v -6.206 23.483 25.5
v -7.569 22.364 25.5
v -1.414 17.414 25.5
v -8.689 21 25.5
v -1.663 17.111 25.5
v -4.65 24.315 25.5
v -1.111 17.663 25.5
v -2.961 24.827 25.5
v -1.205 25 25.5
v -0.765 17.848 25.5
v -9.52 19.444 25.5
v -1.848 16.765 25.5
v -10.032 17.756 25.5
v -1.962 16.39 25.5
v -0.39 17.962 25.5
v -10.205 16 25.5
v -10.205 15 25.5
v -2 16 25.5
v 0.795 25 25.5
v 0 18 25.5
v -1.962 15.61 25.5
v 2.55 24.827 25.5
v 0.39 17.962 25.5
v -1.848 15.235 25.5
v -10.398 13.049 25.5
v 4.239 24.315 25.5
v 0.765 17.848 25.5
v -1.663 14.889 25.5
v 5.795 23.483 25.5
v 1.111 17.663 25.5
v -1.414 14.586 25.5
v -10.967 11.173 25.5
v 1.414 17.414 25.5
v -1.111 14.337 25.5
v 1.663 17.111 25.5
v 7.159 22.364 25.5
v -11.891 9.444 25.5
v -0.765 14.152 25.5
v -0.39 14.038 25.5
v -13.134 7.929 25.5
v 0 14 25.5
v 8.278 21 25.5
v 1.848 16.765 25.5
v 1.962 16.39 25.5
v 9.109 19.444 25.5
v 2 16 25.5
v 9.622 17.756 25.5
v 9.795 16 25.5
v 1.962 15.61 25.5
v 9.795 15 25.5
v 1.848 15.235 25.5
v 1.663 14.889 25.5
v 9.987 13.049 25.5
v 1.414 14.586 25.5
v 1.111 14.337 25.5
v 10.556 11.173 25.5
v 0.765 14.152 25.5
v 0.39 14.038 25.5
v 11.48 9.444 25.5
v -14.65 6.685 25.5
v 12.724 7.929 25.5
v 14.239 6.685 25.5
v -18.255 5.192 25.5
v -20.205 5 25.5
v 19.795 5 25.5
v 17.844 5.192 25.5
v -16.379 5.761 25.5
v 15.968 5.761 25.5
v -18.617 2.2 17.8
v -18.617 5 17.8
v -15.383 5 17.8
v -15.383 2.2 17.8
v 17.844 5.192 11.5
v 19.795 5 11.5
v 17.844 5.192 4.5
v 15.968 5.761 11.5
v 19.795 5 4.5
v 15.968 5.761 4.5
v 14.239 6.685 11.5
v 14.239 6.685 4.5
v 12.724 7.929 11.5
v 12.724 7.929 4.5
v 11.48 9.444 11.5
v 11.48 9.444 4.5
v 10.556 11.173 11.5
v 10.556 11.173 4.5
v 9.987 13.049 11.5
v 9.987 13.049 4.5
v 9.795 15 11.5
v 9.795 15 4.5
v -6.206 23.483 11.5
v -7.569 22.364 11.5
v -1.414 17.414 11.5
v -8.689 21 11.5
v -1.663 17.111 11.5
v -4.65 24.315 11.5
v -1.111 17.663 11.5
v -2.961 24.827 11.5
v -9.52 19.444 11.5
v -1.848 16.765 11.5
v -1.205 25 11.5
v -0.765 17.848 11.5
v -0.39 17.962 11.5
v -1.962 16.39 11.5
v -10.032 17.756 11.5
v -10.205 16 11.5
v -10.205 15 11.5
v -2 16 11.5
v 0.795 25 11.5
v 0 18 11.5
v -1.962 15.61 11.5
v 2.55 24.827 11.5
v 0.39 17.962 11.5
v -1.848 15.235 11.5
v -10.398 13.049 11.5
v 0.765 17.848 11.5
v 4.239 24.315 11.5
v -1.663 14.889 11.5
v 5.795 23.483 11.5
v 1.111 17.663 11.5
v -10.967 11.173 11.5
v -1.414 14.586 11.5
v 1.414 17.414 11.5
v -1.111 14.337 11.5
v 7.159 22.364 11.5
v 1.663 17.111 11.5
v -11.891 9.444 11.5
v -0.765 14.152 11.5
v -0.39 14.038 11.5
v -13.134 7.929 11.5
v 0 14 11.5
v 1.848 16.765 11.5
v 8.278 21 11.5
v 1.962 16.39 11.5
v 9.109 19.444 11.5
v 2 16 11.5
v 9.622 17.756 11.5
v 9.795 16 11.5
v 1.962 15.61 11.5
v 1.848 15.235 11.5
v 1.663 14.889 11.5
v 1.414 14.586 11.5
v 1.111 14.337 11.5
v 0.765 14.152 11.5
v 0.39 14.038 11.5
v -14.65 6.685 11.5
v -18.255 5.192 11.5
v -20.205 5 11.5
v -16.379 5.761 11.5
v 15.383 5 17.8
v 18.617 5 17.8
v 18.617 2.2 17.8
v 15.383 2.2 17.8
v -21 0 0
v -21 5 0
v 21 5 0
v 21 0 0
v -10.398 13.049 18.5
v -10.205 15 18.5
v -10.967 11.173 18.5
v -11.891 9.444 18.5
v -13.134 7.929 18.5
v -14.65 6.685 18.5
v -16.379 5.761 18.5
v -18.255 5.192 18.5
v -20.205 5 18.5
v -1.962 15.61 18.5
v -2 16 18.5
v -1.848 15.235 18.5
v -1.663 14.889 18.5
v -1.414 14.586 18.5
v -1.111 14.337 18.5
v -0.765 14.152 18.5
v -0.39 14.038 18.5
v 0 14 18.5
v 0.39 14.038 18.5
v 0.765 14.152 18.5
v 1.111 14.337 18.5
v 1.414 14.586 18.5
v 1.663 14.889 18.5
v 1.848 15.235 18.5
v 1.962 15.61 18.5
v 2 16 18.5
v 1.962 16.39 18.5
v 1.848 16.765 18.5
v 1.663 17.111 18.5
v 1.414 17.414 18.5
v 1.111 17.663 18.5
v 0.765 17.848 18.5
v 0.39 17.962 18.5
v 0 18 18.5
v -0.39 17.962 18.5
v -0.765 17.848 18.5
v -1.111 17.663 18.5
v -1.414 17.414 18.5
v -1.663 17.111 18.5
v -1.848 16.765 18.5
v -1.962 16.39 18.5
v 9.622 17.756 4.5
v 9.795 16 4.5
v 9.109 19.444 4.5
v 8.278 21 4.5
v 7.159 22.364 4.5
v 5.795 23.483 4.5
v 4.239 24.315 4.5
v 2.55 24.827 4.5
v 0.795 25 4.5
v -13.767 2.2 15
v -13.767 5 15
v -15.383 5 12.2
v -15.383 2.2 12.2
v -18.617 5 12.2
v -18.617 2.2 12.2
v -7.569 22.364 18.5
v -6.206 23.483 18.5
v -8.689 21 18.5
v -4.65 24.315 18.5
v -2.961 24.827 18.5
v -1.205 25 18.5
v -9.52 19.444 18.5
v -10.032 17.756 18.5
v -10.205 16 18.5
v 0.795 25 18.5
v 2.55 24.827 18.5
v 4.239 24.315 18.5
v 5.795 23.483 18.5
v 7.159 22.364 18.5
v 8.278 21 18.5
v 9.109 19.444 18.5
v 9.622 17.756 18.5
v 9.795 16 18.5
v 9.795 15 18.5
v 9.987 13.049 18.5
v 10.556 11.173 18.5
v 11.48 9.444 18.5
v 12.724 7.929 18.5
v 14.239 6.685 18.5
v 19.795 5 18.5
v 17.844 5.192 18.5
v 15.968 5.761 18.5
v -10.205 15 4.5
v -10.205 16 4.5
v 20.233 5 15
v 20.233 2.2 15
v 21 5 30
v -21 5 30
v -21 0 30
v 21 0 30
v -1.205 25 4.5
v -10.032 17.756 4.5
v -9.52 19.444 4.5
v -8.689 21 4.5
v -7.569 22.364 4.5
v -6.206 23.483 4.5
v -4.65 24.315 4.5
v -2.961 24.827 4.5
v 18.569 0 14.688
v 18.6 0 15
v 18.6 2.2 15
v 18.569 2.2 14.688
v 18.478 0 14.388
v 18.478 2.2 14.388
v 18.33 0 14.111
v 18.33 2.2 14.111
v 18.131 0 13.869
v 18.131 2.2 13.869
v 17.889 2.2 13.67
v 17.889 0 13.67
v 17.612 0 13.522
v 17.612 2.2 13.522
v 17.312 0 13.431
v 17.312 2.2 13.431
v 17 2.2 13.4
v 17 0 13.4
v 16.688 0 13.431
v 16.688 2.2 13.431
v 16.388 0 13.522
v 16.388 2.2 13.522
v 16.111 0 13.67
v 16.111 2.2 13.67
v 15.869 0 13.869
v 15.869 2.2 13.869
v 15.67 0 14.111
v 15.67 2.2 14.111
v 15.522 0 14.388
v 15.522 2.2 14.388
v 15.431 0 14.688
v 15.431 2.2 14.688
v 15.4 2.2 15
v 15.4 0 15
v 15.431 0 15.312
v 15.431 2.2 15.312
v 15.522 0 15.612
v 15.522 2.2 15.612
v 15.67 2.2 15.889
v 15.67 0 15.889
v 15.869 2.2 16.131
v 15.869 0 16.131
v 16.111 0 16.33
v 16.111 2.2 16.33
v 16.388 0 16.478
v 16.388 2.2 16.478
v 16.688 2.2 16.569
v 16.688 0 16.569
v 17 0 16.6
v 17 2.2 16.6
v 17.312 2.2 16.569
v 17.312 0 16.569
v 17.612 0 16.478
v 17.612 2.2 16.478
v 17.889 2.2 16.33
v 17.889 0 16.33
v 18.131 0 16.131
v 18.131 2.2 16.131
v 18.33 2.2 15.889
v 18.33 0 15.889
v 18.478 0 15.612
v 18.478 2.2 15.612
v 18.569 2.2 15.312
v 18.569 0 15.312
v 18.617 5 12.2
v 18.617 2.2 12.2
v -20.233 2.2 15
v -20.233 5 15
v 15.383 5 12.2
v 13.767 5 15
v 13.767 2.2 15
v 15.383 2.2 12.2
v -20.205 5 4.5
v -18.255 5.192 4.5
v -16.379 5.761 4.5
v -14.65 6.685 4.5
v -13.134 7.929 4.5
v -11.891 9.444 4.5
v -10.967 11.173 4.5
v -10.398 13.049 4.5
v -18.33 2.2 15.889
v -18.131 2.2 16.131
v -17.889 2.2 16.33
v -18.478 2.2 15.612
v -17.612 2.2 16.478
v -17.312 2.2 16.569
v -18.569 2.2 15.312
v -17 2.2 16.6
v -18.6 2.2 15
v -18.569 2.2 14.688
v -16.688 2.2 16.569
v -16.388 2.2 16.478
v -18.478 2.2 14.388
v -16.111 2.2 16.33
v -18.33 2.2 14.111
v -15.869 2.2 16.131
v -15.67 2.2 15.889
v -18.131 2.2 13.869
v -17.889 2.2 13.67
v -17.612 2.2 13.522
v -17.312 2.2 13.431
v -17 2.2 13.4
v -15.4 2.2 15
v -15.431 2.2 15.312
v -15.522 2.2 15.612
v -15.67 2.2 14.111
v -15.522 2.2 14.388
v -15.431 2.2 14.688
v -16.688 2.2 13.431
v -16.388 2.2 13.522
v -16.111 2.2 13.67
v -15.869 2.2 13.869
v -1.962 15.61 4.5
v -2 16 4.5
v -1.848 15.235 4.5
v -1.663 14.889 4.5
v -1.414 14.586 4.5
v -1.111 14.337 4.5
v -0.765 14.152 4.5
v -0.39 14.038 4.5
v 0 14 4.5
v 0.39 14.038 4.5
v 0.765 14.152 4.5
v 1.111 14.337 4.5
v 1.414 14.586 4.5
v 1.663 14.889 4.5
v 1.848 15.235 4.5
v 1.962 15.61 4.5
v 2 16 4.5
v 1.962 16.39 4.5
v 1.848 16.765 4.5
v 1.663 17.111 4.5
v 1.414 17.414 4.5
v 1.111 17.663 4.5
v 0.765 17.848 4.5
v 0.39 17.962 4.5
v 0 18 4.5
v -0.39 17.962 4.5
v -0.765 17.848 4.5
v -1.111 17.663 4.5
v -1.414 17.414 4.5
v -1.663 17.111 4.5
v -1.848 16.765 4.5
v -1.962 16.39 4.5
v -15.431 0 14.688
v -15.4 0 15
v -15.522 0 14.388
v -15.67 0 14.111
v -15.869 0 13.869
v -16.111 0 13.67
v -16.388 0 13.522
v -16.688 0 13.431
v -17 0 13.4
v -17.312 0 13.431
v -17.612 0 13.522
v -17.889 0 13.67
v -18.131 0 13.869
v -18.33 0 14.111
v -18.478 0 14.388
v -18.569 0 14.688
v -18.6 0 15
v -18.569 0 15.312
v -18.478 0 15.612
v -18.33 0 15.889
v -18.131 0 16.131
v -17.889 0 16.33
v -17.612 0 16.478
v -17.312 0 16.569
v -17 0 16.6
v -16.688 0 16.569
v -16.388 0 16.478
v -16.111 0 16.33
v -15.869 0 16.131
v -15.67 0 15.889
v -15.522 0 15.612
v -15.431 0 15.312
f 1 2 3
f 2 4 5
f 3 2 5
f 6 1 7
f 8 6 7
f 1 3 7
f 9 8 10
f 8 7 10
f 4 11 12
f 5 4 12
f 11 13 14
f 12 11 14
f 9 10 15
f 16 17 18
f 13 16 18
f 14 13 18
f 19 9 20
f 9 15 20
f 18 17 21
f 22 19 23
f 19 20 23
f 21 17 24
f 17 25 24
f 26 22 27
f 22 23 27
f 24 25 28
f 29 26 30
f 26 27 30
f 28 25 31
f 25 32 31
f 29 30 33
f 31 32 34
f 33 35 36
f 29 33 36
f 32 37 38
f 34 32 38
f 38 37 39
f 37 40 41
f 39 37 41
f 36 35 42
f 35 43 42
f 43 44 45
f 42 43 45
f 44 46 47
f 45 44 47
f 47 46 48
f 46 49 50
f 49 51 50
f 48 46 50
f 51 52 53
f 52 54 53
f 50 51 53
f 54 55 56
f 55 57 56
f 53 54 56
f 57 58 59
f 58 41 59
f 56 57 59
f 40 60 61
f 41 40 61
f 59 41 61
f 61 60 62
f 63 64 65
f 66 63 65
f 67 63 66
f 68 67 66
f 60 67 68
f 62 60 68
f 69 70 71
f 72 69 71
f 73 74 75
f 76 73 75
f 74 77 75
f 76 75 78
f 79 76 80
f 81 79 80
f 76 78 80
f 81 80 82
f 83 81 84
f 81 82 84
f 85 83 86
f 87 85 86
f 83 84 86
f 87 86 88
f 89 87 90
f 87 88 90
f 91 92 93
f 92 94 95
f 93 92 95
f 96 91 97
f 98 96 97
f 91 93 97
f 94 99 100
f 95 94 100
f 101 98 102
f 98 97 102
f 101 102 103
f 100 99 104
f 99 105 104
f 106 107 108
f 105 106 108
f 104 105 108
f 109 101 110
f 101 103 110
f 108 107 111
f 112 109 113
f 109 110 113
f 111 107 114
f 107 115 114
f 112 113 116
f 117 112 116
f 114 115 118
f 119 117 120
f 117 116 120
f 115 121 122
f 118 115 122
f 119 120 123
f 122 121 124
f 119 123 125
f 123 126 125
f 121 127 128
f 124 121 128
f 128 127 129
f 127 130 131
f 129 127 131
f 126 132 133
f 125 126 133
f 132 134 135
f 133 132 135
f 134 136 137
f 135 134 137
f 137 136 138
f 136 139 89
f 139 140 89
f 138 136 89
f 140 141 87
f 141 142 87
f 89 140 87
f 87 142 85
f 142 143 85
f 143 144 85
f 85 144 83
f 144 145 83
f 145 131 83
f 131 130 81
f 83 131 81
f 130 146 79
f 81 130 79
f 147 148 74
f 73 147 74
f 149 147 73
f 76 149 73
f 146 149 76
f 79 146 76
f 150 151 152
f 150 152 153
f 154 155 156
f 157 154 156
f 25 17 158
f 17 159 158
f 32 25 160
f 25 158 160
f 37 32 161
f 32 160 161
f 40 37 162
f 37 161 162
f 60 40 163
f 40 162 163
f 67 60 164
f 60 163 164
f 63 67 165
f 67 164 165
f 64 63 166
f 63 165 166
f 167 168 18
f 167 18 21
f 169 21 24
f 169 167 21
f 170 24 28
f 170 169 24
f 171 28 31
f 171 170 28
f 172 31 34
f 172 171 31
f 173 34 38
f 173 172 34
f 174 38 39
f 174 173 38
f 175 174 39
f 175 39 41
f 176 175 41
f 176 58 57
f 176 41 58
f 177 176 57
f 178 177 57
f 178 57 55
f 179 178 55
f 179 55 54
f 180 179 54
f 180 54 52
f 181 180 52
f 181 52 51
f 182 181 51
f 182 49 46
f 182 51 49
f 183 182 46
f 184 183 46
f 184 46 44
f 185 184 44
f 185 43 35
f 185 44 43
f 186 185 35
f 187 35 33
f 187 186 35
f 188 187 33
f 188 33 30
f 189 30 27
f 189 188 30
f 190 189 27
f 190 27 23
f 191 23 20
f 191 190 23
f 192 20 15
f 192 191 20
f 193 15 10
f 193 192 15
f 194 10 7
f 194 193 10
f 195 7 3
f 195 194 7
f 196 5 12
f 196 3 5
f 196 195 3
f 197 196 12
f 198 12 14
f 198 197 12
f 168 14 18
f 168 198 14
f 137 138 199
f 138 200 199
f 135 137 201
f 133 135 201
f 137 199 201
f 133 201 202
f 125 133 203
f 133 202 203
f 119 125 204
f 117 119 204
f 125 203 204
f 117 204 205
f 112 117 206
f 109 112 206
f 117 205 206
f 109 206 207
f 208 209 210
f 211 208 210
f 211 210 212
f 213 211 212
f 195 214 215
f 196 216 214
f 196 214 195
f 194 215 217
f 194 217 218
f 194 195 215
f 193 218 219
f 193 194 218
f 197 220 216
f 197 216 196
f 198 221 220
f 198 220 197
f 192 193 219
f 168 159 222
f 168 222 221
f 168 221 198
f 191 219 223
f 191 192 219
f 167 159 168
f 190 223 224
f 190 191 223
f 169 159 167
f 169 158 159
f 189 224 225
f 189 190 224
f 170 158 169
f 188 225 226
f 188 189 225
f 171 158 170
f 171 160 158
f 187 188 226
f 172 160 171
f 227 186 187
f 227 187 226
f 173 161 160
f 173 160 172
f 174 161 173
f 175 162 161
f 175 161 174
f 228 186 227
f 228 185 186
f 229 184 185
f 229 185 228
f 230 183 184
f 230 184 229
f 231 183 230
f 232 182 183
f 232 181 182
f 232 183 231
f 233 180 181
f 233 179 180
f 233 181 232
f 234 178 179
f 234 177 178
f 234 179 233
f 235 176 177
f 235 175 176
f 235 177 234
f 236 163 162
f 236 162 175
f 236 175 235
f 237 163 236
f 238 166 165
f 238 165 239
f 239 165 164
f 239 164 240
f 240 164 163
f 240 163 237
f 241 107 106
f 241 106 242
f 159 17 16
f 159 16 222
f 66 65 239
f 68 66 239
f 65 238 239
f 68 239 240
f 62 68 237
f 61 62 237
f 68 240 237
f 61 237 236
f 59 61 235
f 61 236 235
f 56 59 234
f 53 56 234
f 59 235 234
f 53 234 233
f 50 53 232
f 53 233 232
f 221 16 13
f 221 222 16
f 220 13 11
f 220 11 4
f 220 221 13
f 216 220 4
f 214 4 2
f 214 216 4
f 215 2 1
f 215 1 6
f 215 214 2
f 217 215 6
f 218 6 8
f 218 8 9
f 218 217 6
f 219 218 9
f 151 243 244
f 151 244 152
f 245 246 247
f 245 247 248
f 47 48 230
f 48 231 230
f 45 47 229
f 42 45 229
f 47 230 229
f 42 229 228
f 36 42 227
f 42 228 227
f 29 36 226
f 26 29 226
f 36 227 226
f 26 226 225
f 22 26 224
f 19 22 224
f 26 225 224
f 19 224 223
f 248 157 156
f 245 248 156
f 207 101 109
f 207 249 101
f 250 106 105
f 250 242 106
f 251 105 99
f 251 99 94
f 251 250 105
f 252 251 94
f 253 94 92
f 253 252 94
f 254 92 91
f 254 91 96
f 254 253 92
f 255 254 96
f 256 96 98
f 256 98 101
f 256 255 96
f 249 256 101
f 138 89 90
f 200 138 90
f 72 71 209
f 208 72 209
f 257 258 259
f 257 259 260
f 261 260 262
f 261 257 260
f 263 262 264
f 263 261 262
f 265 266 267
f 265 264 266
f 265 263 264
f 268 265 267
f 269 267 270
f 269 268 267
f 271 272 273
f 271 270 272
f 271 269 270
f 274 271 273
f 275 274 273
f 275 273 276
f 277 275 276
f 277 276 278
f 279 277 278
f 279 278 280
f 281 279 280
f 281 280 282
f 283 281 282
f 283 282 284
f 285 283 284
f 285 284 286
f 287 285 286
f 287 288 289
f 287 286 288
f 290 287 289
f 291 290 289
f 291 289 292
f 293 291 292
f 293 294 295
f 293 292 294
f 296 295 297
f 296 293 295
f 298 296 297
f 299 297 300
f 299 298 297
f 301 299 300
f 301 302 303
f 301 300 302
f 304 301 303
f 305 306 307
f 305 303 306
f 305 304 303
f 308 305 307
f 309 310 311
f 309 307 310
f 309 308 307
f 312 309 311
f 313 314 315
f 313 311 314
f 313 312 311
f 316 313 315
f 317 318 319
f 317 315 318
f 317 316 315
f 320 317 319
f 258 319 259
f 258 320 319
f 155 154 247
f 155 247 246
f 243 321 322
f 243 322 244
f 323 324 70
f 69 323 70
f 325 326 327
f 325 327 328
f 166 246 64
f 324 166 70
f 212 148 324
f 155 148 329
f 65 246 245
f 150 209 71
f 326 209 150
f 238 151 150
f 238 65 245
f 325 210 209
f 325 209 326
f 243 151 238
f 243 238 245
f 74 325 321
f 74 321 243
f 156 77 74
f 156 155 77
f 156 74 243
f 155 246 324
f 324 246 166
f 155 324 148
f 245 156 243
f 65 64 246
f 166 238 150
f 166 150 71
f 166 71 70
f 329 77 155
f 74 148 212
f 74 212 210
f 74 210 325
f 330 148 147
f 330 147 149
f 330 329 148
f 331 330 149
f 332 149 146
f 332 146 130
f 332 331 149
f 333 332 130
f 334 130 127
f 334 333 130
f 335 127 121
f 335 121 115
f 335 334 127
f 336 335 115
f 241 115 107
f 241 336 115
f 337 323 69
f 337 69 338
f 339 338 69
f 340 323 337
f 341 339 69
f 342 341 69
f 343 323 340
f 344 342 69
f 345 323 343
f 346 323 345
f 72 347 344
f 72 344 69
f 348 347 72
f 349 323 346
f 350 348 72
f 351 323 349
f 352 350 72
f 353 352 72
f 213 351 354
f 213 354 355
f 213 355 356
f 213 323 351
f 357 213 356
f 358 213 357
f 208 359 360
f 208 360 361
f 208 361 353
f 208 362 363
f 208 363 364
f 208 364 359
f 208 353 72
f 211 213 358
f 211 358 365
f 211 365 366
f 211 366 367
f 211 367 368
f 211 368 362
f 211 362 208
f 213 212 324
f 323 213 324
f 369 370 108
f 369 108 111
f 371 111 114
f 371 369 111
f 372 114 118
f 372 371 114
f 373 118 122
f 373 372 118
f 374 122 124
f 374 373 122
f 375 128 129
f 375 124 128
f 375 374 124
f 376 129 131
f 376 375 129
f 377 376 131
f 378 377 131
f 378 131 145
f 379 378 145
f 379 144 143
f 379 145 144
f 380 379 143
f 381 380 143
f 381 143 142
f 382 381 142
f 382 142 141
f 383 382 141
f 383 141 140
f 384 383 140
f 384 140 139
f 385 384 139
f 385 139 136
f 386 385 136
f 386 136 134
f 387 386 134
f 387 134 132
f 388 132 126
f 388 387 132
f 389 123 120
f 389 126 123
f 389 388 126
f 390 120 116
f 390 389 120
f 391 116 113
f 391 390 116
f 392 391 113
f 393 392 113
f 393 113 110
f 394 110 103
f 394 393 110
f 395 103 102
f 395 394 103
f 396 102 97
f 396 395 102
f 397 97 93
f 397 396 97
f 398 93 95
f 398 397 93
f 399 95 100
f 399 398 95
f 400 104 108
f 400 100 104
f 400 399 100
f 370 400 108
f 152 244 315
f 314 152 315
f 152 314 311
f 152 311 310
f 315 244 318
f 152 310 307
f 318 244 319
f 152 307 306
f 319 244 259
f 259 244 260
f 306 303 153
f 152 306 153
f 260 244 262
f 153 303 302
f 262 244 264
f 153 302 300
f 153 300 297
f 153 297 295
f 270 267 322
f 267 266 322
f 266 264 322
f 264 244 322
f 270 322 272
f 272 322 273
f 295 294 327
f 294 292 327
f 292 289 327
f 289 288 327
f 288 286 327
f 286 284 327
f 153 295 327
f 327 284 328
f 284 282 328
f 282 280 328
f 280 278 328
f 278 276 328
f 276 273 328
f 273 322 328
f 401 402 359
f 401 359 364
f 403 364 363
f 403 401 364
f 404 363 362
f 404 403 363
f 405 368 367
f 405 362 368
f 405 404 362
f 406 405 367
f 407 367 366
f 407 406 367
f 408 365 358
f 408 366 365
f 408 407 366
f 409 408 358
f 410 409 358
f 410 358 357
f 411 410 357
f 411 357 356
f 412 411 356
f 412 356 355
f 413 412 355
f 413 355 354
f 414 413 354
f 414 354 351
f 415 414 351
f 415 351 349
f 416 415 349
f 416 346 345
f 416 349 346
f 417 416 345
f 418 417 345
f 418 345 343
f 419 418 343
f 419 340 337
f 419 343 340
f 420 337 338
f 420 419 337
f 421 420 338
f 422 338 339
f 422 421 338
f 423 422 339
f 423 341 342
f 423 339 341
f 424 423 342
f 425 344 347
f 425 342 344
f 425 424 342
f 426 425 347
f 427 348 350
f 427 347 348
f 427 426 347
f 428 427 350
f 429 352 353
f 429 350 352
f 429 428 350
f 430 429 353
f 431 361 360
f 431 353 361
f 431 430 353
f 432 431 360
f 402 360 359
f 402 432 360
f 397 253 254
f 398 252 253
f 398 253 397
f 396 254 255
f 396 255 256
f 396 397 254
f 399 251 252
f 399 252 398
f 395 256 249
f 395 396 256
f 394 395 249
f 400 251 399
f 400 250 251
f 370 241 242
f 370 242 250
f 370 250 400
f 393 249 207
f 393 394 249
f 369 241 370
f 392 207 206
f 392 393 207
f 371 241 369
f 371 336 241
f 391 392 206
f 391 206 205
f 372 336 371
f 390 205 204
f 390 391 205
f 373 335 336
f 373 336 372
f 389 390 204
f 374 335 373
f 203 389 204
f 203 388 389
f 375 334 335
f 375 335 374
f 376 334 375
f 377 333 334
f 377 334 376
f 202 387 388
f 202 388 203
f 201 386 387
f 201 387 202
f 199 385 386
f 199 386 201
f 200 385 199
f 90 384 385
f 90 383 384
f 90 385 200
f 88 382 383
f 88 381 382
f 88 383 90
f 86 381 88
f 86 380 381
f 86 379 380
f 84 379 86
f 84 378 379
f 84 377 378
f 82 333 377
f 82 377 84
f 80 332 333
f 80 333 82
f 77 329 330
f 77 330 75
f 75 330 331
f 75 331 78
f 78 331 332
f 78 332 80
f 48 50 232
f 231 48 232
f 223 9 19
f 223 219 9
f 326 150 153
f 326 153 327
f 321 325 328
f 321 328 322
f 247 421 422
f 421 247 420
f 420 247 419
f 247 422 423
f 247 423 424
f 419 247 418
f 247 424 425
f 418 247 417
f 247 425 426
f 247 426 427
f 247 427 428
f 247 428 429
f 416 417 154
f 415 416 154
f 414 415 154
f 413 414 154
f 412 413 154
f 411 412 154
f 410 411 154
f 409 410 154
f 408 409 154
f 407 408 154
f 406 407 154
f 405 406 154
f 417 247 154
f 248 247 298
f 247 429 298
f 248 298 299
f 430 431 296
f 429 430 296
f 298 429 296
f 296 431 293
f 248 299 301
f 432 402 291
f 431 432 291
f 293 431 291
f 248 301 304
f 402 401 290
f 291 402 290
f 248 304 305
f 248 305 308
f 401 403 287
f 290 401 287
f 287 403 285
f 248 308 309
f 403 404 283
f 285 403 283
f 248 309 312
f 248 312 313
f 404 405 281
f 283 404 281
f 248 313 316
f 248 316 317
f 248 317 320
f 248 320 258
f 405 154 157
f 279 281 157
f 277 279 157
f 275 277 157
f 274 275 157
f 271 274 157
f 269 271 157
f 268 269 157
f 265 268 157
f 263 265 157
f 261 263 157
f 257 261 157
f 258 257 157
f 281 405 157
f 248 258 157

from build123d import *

# Parameters (mm, degrees)
CROQUIS1_W                 = 42
CROQUIS1_H                 = 5
SALIENTE_EXTRUIR1_DEPTH    = 30
CORTAR_EXTRUIR1_DEPTH      = 15
CORTAR_EXTRUIR1_DEPTH_BACK = 21
CROQUIS2_R                 = 1.6
CORTAR_EXTRUIR2_DEPTH      = 2.8
CROQUIS4_W                 = 20
CROQUIS4_H                 = 7
SALIENTE_EXTRUIR2_DEPTH    = 20
FILLET1_R                  = 9
CUT_EXTRUDE1_DEPTH         = 15
CUT_EXTRUDE1_DEPTH_BACK    = 32
SKETCH1_R                  = 2
FILLET2_R                  = 10


with BuildPart() as part:
    # Croquis1 → Saliente-Extruir1 (new body)
    with BuildSketch(Plane.XY):
        with Locations((0, 2.5)):
            Rectangle(CROQUIS1_W, CROQUIS1_H)
    extrude(amount=SALIENTE_EXTRUIR1_DEPTH)

    # Croquis2 → Cortar-Extruir1 (cut, two sides: drawn at the far end of the back side and taken through both)
    with BuildSketch(Plane(origin=(0, 5, 0), x_dir=(1, 0, 0), z_dir=(0, 1, 0)).offset(-CORTAR_EXTRUIR1_DEPTH_BACK)):
        with Locations((-17, -15)):
            Circle(CROQUIS2_R)
        with Locations((17, -15)):
            Circle(CROQUIS2_R)
    extrude(amount=CORTAR_EXTRUIR1_DEPTH + CORTAR_EXTRUIR1_DEPTH_BACK, mode=Mode.SUBTRACT)

    # Croquis3 → Cortar-Extruir2 (cut)
    with BuildSketch(Plane(origin=(0, 5, 0), x_dir=(1, 0, 0), z_dir=(0, 1, 0))):
        Polygon((15.383419246, -17.8), (13.766838493, -15), (15.383419246, -12.2), (18.616580754, -12.2), (20.233161507, -15), (18.616580754, -17.8), align=None)
        Polygon((-13.766838493, -15), (-15.383419246, -12.2), (-18.616580754, -12.2), (-20.233161507, -15), (-18.616580754, -17.8), (-15.383419246, -17.8), align=None)
    extrude(amount=-CORTAR_EXTRUIR2_DEPTH, mode=Mode.SUBTRACT)

    # Croquis4 → Saliente-Extruir2 (add)
    with BuildSketch(Plane(origin=(0, 5, 0), x_dir=(1, 0, 0), z_dir=(0, 1, 0))):
        with Locations((-0.205428596, -22)):
            Rectangle(CROQUIS4_W, CROQUIS4_H)
        with Locations((-0.205428596, -8)):
            Rectangle(CROQUIS4_W, CROQUIS4_H)
    extrude(amount=SALIENTE_EXTRUIR2_DEPTH)

    # Fillet1
    fillet1_edges = [part.edges().sort_by_distance(p)[0] for p in [
        (-10.205428596, 25, 22),
        (9.794571404, 25, 22),
        (-10.205428596, 25, 8),
        (9.794571404, 25, 8),
    ]]
    fillet(fillet1_edges, radius=FILLET1_R)

    # Sketch1 → Cut-Extrude1 (cut, two sides: drawn at the far end of the back side and taken through both)
    with BuildSketch(Plane.XY.offset(25.5).offset(-CUT_EXTRUDE1_DEPTH_BACK)):
        with Locations(Location((0, 16, 0), (0, 0, 180))):
            Circle(SKETCH1_R)
    extrude(amount=CUT_EXTRUDE1_DEPTH + CUT_EXTRUDE1_DEPTH_BACK, mode=Mode.SUBTRACT)

    # Fillet2
    fillet2_edges = [part.edges().sort_by_distance(p)[0] for p in [
        (-10.205428596, 5, 22),
        (9.794571404, 5, 22),
        (-10.205428596, 5, 8),
        (9.794571404, 5, 8),
    ]]
    fillet(fillet2_edges, radius=FILLET2_R)


solid = part.part
